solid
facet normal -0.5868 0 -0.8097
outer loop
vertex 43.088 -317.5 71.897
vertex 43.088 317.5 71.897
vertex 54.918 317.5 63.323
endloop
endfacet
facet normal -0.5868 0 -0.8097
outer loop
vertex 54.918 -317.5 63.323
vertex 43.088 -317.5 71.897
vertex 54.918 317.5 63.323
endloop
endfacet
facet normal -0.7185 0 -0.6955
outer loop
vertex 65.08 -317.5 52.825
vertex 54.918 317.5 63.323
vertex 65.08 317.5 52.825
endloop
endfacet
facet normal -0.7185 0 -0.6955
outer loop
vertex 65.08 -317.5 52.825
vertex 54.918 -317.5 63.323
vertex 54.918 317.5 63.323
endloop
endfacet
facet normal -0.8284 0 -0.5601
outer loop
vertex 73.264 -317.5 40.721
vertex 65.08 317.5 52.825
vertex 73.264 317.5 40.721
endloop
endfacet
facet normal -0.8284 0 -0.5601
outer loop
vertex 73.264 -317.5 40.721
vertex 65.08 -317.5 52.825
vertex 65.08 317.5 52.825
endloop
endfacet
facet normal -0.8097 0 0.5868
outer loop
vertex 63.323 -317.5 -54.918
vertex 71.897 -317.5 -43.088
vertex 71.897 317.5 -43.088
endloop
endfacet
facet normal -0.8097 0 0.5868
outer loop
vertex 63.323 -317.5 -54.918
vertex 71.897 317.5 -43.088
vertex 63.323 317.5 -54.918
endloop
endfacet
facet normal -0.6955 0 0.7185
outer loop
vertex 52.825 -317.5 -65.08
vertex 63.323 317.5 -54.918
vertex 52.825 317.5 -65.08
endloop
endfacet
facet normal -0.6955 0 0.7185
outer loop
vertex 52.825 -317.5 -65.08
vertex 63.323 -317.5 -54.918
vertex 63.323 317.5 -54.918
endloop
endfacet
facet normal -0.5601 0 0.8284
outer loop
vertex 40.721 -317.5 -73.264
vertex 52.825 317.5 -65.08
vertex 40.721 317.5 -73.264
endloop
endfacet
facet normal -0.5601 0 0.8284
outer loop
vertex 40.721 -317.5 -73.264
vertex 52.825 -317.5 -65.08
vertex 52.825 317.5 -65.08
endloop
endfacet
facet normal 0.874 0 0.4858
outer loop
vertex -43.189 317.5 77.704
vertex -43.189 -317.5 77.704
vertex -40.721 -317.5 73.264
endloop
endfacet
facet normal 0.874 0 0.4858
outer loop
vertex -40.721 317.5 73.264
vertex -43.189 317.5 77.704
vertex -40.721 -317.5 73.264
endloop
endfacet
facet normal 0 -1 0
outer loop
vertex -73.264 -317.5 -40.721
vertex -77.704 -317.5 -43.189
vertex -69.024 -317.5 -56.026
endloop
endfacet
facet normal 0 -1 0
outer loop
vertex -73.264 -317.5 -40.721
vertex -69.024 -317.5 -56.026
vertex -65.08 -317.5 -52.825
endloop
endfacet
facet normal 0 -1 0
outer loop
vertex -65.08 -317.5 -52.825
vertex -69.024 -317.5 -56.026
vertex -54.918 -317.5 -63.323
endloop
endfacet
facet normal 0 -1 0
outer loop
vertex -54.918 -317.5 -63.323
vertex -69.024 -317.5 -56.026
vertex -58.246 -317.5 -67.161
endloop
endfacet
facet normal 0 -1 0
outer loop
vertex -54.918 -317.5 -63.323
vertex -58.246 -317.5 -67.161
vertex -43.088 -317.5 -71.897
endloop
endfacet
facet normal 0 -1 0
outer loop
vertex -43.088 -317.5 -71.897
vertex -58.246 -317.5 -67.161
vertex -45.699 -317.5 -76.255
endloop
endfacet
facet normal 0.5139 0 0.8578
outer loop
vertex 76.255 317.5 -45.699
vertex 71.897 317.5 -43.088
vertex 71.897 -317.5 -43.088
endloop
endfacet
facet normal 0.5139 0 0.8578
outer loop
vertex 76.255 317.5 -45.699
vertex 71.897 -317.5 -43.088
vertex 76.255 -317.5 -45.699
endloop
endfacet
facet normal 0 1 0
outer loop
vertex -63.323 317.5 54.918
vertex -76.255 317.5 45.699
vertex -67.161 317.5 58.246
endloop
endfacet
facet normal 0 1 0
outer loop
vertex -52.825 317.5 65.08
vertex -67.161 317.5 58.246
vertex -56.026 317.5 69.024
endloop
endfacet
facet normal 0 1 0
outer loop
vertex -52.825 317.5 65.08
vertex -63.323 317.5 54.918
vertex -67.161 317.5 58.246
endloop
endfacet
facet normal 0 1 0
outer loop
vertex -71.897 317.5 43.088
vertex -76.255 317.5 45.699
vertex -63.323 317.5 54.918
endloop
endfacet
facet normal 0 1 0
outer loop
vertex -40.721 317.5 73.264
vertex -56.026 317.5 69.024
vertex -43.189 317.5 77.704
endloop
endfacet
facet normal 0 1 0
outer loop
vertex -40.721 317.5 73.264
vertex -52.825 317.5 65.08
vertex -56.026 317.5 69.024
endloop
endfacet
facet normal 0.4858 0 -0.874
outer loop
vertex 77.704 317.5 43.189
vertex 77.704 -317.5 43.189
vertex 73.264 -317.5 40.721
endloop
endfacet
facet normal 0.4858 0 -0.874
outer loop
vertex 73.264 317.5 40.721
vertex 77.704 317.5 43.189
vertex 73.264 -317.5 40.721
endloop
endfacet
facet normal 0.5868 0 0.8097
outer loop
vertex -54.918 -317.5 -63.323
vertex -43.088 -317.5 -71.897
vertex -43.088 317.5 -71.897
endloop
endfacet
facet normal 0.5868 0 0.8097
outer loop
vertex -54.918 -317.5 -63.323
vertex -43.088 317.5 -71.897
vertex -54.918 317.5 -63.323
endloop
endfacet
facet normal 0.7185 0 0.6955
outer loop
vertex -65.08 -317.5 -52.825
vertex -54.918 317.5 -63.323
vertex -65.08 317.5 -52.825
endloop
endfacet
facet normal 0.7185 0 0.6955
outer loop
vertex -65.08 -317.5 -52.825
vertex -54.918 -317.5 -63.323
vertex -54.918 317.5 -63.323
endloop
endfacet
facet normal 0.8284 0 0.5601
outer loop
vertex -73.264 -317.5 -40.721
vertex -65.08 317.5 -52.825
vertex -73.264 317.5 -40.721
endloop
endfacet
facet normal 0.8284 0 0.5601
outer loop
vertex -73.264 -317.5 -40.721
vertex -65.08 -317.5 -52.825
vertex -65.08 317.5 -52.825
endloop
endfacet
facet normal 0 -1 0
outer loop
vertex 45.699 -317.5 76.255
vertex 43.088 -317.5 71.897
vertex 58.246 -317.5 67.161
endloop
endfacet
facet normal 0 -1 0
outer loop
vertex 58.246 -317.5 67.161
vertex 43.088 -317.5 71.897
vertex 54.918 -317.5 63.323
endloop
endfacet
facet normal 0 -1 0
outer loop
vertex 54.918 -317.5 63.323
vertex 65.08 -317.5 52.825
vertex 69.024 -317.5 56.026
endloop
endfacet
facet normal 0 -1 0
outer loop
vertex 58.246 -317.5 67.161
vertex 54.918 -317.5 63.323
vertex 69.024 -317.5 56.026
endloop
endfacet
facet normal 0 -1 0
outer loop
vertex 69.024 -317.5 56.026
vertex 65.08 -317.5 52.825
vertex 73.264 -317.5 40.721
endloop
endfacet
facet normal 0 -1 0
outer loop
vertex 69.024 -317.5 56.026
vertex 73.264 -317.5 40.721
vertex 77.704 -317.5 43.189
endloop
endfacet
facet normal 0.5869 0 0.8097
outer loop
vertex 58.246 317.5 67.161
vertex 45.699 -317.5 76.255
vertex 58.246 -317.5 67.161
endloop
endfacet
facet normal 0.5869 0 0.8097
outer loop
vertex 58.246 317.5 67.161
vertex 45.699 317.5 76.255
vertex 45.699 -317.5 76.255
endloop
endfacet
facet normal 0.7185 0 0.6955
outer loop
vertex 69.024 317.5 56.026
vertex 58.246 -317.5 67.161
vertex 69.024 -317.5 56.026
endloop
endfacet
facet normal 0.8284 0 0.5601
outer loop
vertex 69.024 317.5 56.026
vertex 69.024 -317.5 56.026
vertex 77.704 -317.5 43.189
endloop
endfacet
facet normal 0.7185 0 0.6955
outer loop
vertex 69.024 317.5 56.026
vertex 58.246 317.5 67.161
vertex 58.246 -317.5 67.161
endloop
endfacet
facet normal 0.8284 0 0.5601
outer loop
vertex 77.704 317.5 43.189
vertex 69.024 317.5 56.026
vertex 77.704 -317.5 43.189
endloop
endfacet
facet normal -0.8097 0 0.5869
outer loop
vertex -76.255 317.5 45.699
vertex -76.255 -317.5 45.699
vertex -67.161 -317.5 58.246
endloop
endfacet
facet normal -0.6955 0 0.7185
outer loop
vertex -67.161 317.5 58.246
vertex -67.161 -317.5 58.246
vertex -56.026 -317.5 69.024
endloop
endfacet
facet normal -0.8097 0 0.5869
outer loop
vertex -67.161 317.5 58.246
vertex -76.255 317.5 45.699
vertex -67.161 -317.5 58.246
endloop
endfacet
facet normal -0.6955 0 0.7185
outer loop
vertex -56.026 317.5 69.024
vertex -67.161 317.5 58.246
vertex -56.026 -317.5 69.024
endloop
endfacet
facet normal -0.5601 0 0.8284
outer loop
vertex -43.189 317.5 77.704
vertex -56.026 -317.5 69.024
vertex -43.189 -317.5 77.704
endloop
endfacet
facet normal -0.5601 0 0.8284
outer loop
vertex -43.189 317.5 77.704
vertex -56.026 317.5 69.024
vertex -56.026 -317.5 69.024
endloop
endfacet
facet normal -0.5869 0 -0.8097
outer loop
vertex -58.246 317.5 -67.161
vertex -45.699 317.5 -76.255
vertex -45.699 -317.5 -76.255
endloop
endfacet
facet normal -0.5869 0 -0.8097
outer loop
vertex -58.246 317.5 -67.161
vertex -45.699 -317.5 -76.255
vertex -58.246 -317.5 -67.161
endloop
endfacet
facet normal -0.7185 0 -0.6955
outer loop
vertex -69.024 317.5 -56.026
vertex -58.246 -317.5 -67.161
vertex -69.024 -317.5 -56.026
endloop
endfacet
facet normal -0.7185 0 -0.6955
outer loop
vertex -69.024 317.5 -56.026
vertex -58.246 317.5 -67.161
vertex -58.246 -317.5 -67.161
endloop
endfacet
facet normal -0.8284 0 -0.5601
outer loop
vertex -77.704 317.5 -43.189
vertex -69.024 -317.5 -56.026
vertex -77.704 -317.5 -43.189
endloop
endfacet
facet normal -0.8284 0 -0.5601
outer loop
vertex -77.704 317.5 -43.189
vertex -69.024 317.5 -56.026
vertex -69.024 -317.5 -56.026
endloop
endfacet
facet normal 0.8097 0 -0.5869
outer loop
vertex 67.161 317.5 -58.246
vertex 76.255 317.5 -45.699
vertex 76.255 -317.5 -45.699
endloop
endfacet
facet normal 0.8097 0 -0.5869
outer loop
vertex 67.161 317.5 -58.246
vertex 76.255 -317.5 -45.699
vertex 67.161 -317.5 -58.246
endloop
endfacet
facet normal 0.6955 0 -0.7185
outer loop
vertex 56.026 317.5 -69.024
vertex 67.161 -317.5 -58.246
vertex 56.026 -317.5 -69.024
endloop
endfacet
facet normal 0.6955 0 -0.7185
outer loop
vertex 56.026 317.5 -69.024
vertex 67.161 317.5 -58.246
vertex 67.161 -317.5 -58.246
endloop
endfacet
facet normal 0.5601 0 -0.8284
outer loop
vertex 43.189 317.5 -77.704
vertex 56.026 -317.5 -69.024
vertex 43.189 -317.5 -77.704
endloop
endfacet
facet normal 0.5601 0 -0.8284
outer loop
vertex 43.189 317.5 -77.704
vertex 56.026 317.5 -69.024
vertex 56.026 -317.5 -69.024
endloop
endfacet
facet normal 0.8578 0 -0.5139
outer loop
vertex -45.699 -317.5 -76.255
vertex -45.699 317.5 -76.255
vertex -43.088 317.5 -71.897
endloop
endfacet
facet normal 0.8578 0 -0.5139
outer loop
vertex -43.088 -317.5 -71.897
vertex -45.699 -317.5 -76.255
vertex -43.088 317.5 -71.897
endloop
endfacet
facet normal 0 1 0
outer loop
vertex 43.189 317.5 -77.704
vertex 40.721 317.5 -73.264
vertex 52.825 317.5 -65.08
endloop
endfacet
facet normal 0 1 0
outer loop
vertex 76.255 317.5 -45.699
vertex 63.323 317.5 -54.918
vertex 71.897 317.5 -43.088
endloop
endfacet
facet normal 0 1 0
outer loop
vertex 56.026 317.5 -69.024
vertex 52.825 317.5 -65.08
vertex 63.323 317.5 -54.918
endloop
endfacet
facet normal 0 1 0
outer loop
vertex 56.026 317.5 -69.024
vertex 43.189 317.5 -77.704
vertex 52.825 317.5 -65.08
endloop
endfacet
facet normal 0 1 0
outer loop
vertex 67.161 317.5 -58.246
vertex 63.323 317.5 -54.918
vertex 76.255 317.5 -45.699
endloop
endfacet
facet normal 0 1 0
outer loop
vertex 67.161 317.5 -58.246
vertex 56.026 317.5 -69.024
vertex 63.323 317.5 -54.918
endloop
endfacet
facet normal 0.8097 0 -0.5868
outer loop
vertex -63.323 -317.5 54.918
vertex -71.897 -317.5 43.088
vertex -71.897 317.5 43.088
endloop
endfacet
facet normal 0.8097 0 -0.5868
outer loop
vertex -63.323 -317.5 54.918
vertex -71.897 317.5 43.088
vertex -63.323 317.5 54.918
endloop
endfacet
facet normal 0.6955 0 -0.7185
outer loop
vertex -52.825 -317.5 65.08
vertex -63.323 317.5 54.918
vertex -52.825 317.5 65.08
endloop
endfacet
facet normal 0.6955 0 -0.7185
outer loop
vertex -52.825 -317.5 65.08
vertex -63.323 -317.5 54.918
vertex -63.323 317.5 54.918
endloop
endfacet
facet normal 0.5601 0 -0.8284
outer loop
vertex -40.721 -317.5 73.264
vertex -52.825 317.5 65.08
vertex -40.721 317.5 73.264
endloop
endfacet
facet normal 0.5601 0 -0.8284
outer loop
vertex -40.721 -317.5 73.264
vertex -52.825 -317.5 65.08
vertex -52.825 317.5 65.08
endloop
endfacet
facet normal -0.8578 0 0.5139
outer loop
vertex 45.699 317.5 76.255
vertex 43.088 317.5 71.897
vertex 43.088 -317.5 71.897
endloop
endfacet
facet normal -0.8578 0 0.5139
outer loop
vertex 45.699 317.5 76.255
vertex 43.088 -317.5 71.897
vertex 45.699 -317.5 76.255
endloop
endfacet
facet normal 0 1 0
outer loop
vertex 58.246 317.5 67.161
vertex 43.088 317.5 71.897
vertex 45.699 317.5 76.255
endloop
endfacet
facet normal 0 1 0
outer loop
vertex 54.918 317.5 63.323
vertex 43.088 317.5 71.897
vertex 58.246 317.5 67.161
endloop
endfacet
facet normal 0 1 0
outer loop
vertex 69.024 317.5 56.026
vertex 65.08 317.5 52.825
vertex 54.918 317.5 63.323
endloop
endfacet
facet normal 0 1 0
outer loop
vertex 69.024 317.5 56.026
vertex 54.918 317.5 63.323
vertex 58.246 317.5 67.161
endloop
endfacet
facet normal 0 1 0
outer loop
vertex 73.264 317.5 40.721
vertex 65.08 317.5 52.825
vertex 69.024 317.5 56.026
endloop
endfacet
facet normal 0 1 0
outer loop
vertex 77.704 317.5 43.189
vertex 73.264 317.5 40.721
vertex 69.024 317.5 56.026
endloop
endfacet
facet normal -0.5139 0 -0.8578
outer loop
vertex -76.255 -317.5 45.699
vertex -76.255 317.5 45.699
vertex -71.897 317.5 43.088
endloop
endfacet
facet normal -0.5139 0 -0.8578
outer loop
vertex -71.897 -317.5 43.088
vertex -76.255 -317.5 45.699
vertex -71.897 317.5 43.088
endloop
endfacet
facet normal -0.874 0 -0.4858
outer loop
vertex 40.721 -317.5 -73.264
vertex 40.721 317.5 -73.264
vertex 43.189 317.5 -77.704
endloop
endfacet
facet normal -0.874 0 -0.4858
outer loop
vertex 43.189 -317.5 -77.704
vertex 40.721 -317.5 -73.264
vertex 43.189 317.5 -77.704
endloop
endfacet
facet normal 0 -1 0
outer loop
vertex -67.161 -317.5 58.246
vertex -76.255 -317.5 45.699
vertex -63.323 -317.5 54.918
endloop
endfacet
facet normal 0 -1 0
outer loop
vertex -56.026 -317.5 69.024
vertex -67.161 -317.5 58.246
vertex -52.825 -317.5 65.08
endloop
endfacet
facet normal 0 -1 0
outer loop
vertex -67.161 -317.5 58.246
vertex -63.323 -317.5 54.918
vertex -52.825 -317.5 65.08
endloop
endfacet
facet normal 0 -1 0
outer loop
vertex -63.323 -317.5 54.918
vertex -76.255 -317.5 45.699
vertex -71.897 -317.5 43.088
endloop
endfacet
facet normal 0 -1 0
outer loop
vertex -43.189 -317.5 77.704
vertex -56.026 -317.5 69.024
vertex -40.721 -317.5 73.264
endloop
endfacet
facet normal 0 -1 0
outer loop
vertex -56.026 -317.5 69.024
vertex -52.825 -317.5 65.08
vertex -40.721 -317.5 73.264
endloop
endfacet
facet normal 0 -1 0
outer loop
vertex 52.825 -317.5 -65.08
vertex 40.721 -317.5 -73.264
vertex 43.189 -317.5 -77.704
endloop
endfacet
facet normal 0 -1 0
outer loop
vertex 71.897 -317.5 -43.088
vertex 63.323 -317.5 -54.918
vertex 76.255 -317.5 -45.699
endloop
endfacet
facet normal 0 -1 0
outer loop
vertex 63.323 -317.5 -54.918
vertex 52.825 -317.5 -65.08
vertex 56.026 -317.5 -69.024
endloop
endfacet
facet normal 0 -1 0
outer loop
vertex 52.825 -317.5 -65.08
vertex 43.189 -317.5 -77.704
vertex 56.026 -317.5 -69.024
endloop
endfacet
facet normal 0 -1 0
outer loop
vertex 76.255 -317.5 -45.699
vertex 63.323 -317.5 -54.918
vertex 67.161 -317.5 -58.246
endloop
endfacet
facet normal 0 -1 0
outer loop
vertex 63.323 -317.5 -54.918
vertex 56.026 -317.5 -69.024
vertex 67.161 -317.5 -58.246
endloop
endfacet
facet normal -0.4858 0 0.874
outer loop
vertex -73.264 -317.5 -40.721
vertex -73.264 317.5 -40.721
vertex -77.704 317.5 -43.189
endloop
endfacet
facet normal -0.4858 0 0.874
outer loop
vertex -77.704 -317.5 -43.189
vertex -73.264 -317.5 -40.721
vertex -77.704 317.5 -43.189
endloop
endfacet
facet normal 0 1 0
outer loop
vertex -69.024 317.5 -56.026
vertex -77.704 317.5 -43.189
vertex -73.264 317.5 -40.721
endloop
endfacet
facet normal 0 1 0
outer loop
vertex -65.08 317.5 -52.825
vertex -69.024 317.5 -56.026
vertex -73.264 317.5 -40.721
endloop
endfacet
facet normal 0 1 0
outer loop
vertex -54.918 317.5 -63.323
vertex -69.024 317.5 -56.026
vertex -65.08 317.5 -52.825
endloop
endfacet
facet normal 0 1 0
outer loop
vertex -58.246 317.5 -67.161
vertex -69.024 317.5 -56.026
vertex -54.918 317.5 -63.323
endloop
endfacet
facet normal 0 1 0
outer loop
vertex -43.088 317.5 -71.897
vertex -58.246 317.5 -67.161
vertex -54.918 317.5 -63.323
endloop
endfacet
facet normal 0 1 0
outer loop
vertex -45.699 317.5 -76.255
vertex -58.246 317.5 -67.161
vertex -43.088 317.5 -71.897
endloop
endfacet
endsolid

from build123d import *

# Parameters (mm, degrees)
SKETCH2_R               = 88.9
SKETCH2_R_2             = 83.82
BOSS_EXTRUDE1_DEPTH     = 317.5
CUT_EXTRUDE1_DEPTH      = 318.5
CUT_EXTRUDE1_DEPTH_BACK = 318.5


with BuildPart() as part:
    # Sketch2 → Boss-Extrude1 (new body, symmetric)
    with BuildSketch(Plane(origin=(0, 0, 0), x_dir=(1, 0, 0), z_dir=(0, 1, 0))):
        Circle(SKETCH2_R)
        Circle(SKETCH2_R_2, mode=Mode.SUBTRACT)
    extrude(amount=BOSS_EXTRUDE1_DEPTH, both=True)

    # Sketch3 → Cut-Extrude1 (cut, two sides)
    with BuildSketch(Plane(origin=(0, 0, 0), x_dir=(1, 0, 0), z_dir=(0, 1, 0))) as cut_extrude1_sk:
        Polygon((169.661755759, -94.300371224), (0, 0), (169.661755759, 101.677593364), align=None)
        Polygon((0, 0), (53.900027233, 96.974944394), (-58.116685864, 96.974944394), align=None)
        Polygon((-123.741299607, 68.777140945), (-123.741299607, -74.157652604), (0, 0), align=None)
        Polygon((-65.840936026, -118.45858783), (0, 0), (70.991745134, -118.45858783), align=None)
    extrude(amount=CUT_EXTRUDE1_DEPTH, mode=Mode.SUBTRACT)
    extrude(cut_extrude1_sk.sketch, amount=-CUT_EXTRUDE1_DEPTH_BACK, mode=Mode.SUBTRACT)


solid = part.part
